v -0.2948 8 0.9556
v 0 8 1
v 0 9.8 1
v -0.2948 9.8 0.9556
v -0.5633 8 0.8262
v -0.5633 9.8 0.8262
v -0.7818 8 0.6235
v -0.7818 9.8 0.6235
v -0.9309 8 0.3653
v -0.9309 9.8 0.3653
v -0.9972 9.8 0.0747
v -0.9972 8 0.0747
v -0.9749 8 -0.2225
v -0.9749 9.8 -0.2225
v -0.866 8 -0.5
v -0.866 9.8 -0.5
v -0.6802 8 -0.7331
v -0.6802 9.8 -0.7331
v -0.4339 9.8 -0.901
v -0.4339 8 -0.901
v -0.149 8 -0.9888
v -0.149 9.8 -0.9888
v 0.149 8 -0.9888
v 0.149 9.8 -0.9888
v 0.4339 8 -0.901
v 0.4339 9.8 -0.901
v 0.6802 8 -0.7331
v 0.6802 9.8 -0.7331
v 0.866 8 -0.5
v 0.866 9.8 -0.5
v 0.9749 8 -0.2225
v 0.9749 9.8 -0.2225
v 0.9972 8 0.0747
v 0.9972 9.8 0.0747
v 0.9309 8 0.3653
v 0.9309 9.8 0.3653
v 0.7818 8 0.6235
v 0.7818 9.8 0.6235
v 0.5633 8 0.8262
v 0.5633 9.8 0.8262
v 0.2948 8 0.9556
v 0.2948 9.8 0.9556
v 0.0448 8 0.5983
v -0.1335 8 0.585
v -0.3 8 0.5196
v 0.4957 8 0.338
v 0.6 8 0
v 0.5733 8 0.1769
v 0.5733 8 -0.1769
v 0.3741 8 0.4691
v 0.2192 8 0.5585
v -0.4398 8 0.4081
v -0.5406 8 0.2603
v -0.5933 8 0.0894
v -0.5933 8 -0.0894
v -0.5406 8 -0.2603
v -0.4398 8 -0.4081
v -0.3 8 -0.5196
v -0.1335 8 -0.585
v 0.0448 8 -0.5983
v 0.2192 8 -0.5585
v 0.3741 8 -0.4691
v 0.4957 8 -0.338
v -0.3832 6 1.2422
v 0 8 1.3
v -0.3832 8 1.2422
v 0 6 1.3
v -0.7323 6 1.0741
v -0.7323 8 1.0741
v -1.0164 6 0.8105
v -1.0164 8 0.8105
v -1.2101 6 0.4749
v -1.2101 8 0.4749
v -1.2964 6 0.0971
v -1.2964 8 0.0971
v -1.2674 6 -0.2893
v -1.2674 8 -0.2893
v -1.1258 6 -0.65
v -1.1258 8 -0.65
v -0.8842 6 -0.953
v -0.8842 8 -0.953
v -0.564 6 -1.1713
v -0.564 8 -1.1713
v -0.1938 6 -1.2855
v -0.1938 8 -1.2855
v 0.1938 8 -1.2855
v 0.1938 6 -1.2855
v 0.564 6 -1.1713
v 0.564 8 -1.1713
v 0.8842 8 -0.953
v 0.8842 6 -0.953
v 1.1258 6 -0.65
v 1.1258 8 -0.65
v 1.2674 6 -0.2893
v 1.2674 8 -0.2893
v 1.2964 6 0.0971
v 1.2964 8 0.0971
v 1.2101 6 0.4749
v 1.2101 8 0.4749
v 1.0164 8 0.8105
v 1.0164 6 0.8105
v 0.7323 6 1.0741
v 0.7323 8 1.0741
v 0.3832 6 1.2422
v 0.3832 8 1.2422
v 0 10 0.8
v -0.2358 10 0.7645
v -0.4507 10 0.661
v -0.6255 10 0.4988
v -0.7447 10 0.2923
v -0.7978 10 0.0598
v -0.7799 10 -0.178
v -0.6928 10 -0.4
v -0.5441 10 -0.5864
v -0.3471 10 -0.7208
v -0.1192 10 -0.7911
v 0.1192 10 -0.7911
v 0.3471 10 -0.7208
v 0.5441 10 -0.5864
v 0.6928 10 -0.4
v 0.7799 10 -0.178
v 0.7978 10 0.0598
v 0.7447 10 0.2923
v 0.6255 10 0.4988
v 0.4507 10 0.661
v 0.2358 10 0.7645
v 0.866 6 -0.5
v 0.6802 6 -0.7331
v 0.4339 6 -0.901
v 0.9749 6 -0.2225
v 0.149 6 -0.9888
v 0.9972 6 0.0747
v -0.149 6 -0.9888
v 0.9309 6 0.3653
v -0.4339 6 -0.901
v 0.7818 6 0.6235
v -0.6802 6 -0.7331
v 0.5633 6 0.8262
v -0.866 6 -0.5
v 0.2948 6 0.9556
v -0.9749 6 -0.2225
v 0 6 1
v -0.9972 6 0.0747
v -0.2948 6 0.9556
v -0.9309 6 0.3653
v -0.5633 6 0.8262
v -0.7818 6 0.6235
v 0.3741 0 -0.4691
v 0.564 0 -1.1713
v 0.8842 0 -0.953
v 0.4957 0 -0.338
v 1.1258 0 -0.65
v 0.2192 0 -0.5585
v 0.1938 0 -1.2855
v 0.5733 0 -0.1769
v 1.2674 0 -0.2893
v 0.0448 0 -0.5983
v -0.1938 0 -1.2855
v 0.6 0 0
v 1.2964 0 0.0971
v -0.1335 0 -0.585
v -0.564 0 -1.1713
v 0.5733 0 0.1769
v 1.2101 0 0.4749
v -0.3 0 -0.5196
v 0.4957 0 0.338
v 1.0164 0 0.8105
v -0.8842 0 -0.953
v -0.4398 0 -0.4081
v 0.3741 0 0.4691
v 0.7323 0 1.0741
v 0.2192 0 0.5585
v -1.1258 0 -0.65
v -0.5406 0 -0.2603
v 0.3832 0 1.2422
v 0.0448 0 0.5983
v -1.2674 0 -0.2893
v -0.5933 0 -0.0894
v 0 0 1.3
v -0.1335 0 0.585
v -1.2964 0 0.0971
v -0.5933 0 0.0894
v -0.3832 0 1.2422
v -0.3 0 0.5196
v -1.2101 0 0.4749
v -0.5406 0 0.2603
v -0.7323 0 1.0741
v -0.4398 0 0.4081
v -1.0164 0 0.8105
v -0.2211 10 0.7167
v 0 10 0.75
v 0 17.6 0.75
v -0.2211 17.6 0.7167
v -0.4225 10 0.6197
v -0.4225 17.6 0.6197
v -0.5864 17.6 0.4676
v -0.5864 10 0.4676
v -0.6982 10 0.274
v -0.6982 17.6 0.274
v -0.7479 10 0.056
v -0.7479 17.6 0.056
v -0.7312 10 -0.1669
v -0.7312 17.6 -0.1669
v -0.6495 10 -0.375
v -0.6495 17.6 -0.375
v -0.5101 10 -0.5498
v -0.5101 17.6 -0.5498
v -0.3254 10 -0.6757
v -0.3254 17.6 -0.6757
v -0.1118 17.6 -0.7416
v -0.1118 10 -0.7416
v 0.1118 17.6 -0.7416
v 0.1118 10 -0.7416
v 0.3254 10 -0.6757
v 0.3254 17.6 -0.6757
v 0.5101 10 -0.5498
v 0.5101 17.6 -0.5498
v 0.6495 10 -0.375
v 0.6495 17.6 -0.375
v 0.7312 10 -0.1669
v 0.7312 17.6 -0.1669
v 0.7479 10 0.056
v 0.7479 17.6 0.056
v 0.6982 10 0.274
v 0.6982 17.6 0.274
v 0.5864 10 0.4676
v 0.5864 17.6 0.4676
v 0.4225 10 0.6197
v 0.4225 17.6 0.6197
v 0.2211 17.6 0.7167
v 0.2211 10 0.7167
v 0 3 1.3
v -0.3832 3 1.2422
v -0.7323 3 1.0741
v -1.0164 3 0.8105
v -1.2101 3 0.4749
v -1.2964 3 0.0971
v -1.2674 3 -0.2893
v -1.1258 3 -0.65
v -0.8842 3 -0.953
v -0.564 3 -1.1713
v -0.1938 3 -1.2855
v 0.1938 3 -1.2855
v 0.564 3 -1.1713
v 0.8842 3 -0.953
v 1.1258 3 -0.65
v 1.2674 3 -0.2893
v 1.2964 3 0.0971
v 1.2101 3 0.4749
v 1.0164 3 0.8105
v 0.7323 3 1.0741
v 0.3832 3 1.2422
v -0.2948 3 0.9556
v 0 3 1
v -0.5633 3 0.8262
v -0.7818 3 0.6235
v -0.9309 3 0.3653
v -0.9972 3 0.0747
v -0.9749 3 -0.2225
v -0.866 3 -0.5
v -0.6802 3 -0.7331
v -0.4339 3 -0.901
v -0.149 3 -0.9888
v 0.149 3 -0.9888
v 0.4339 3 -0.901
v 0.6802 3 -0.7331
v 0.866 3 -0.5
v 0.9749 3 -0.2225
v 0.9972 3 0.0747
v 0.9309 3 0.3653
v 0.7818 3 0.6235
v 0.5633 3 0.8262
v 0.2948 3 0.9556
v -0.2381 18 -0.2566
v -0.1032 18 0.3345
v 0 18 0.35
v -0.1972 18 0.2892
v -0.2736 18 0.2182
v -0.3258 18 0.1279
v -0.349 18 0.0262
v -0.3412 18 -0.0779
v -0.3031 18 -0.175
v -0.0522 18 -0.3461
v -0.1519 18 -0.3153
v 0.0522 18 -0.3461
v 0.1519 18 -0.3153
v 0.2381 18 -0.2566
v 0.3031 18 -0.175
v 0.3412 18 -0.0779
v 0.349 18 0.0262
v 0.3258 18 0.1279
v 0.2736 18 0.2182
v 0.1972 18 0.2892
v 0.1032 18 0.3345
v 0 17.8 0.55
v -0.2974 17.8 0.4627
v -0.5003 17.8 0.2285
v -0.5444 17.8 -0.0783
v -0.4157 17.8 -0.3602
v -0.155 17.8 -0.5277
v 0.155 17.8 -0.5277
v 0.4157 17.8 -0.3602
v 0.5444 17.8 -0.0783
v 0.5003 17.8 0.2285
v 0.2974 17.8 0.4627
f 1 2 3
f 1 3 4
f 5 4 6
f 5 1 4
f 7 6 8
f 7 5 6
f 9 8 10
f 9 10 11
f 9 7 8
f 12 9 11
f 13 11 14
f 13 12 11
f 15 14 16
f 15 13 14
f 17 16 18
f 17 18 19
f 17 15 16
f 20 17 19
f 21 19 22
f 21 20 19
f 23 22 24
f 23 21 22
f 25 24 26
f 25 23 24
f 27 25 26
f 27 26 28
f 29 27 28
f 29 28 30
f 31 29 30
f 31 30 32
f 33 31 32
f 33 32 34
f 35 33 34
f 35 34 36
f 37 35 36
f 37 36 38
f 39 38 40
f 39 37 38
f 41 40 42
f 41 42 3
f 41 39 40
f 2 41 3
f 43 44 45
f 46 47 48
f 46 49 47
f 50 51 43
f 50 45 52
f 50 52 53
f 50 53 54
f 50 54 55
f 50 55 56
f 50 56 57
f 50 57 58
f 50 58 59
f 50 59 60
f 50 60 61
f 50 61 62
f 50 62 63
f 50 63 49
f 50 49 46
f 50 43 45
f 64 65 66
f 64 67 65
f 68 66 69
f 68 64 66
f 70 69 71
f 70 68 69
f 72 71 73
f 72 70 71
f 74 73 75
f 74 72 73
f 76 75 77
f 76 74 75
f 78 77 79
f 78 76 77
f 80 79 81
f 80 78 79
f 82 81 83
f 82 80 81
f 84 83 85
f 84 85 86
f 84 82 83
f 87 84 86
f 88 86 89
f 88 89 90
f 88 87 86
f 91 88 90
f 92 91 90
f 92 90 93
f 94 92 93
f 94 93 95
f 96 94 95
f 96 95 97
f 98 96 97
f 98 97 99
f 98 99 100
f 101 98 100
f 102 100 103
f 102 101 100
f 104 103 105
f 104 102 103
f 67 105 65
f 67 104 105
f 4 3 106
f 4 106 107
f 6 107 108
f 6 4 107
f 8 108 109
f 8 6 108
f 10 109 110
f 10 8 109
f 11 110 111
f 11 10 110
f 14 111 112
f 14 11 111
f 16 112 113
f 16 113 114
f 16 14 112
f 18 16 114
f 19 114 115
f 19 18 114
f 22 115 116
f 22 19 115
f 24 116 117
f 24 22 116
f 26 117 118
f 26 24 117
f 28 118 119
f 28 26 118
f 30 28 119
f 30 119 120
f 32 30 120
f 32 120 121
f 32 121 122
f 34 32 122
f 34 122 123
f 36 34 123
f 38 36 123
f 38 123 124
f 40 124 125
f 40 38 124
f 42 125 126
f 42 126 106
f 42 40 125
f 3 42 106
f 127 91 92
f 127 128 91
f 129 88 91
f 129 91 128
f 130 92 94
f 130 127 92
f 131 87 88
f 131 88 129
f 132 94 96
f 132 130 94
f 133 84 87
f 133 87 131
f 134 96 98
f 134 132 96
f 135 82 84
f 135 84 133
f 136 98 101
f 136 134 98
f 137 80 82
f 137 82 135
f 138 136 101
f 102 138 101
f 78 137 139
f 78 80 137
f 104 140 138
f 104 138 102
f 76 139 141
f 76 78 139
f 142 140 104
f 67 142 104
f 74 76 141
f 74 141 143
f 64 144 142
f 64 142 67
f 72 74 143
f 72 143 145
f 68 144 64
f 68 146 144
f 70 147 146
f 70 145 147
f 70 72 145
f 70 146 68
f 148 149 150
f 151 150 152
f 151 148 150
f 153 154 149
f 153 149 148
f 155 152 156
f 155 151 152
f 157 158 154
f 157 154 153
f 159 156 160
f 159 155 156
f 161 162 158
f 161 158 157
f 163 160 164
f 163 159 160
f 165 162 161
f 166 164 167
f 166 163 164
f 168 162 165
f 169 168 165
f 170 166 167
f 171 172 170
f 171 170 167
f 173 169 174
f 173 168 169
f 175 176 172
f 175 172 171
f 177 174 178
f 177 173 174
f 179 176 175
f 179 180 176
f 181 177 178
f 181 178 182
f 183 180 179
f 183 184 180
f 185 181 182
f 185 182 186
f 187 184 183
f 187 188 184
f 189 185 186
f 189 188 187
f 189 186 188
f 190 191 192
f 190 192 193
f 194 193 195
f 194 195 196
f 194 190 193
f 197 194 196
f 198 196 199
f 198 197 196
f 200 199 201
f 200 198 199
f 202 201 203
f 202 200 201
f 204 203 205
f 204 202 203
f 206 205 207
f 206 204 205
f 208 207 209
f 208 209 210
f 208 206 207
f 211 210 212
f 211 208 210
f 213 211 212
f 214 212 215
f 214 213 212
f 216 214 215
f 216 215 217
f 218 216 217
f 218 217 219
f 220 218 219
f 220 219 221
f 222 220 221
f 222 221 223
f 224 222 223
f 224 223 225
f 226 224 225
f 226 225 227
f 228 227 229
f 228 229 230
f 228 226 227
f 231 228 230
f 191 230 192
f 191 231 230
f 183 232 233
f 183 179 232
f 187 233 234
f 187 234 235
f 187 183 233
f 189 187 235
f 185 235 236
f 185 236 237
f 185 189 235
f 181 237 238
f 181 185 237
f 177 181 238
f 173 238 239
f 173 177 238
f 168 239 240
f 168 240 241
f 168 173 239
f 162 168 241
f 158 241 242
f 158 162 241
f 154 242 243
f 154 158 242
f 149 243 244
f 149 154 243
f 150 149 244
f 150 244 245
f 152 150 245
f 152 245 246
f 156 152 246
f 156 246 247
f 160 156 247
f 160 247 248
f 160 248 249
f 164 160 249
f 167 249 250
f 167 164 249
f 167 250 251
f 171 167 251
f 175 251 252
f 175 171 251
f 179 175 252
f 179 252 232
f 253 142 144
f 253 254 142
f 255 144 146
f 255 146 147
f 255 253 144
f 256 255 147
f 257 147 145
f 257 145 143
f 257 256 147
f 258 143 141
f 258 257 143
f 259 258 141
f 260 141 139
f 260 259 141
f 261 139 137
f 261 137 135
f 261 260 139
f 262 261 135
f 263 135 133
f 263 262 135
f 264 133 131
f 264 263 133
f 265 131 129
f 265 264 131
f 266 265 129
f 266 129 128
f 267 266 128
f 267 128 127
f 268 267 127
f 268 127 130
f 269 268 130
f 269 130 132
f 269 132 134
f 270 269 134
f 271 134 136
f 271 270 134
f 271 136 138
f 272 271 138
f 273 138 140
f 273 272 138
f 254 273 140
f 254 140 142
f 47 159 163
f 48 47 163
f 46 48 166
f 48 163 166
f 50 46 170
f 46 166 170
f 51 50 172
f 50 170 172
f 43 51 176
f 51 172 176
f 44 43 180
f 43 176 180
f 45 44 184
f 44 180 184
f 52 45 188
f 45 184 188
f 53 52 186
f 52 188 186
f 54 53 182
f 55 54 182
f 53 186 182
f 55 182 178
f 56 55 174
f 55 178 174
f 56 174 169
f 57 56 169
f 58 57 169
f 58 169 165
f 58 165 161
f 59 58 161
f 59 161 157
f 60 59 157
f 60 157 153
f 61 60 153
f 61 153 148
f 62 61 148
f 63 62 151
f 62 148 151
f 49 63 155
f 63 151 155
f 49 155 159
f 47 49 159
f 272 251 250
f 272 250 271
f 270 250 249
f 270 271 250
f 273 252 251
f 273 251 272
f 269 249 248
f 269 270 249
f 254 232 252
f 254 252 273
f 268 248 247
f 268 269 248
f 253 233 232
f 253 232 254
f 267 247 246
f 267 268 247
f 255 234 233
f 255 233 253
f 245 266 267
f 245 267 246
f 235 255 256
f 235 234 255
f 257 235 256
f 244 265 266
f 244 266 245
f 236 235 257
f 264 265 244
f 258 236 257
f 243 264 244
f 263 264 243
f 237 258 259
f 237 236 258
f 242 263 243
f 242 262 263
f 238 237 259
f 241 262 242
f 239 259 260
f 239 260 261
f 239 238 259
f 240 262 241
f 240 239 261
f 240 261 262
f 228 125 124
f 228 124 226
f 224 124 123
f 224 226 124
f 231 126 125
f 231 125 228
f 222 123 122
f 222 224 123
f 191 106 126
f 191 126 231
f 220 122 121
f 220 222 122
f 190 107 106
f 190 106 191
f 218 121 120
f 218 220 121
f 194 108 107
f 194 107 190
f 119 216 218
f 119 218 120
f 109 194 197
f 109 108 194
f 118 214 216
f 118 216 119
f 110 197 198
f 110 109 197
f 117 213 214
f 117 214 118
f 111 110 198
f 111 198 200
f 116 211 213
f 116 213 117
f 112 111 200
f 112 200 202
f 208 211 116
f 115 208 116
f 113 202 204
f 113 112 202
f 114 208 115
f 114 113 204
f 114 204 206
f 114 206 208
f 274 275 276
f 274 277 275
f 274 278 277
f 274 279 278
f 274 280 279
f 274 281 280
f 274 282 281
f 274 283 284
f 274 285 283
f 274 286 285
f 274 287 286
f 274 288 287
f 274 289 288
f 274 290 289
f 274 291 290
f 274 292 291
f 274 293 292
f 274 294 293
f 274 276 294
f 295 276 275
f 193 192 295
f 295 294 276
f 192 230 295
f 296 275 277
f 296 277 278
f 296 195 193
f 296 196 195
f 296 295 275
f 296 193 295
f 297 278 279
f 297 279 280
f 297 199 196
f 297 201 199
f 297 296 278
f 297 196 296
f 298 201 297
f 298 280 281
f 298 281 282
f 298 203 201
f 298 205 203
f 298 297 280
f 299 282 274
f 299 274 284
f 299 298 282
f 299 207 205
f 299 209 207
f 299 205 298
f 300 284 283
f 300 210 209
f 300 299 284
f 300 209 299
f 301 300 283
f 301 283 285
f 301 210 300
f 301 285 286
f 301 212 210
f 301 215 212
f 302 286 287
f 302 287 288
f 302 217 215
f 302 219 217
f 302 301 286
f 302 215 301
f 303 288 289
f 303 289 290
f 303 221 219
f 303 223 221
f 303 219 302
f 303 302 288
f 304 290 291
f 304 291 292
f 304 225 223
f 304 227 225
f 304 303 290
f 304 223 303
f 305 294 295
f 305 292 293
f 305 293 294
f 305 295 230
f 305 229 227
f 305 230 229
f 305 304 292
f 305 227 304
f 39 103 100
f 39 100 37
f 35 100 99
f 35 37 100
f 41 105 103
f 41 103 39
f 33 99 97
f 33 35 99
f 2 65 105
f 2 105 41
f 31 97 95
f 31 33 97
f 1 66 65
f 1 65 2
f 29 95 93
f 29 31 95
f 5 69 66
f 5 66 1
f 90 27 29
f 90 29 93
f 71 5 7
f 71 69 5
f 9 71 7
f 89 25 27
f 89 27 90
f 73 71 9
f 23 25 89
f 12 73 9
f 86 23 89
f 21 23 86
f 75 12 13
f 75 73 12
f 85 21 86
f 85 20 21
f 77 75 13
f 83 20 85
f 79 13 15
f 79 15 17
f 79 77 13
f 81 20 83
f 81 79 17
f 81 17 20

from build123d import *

# Parameters (mm, degrees)
F2_SIZE  = 0.4
F3_SIZE  = 0.2
F4_R     = 0.6
F5_DEPTH = 8


with BuildPart() as f1:
    # F0 (on Right) → F1 (revolve)
    with BuildSketch(Plane.YZ):
        Polygon((0, 1.3), (0, 0), (18, 0), (18, 0.75), (10, 0.75), (10, 1), (8, 1), (8, 1.3), (6, 1.3), (6, 1), (3, 1), (3, 1.3), align=None)
    revolve(axis=Axis((0, 9, 0), (0, -1, 0)))

    # F2
    f2_edges = [f1.edges().sort_by_distance(p)[0] for p in [
        (0, 18, -0.75),
    ]]
    chamfer(f2_edges, length=F2_SIZE)

    # F3
    f3_edges = [f1.edges().sort_by_distance(p)[0] for p in [
        (0, 10, -1),
    ]]
    chamfer(f3_edges, length=F3_SIZE)

    # F4 (on face) → F5 (cut)
    with BuildSketch(Plane.XZ):
        Circle(F4_R)
    extrude(amount=-F5_DEPTH, mode=Mode.SUBTRACT)


solid = f1.part
